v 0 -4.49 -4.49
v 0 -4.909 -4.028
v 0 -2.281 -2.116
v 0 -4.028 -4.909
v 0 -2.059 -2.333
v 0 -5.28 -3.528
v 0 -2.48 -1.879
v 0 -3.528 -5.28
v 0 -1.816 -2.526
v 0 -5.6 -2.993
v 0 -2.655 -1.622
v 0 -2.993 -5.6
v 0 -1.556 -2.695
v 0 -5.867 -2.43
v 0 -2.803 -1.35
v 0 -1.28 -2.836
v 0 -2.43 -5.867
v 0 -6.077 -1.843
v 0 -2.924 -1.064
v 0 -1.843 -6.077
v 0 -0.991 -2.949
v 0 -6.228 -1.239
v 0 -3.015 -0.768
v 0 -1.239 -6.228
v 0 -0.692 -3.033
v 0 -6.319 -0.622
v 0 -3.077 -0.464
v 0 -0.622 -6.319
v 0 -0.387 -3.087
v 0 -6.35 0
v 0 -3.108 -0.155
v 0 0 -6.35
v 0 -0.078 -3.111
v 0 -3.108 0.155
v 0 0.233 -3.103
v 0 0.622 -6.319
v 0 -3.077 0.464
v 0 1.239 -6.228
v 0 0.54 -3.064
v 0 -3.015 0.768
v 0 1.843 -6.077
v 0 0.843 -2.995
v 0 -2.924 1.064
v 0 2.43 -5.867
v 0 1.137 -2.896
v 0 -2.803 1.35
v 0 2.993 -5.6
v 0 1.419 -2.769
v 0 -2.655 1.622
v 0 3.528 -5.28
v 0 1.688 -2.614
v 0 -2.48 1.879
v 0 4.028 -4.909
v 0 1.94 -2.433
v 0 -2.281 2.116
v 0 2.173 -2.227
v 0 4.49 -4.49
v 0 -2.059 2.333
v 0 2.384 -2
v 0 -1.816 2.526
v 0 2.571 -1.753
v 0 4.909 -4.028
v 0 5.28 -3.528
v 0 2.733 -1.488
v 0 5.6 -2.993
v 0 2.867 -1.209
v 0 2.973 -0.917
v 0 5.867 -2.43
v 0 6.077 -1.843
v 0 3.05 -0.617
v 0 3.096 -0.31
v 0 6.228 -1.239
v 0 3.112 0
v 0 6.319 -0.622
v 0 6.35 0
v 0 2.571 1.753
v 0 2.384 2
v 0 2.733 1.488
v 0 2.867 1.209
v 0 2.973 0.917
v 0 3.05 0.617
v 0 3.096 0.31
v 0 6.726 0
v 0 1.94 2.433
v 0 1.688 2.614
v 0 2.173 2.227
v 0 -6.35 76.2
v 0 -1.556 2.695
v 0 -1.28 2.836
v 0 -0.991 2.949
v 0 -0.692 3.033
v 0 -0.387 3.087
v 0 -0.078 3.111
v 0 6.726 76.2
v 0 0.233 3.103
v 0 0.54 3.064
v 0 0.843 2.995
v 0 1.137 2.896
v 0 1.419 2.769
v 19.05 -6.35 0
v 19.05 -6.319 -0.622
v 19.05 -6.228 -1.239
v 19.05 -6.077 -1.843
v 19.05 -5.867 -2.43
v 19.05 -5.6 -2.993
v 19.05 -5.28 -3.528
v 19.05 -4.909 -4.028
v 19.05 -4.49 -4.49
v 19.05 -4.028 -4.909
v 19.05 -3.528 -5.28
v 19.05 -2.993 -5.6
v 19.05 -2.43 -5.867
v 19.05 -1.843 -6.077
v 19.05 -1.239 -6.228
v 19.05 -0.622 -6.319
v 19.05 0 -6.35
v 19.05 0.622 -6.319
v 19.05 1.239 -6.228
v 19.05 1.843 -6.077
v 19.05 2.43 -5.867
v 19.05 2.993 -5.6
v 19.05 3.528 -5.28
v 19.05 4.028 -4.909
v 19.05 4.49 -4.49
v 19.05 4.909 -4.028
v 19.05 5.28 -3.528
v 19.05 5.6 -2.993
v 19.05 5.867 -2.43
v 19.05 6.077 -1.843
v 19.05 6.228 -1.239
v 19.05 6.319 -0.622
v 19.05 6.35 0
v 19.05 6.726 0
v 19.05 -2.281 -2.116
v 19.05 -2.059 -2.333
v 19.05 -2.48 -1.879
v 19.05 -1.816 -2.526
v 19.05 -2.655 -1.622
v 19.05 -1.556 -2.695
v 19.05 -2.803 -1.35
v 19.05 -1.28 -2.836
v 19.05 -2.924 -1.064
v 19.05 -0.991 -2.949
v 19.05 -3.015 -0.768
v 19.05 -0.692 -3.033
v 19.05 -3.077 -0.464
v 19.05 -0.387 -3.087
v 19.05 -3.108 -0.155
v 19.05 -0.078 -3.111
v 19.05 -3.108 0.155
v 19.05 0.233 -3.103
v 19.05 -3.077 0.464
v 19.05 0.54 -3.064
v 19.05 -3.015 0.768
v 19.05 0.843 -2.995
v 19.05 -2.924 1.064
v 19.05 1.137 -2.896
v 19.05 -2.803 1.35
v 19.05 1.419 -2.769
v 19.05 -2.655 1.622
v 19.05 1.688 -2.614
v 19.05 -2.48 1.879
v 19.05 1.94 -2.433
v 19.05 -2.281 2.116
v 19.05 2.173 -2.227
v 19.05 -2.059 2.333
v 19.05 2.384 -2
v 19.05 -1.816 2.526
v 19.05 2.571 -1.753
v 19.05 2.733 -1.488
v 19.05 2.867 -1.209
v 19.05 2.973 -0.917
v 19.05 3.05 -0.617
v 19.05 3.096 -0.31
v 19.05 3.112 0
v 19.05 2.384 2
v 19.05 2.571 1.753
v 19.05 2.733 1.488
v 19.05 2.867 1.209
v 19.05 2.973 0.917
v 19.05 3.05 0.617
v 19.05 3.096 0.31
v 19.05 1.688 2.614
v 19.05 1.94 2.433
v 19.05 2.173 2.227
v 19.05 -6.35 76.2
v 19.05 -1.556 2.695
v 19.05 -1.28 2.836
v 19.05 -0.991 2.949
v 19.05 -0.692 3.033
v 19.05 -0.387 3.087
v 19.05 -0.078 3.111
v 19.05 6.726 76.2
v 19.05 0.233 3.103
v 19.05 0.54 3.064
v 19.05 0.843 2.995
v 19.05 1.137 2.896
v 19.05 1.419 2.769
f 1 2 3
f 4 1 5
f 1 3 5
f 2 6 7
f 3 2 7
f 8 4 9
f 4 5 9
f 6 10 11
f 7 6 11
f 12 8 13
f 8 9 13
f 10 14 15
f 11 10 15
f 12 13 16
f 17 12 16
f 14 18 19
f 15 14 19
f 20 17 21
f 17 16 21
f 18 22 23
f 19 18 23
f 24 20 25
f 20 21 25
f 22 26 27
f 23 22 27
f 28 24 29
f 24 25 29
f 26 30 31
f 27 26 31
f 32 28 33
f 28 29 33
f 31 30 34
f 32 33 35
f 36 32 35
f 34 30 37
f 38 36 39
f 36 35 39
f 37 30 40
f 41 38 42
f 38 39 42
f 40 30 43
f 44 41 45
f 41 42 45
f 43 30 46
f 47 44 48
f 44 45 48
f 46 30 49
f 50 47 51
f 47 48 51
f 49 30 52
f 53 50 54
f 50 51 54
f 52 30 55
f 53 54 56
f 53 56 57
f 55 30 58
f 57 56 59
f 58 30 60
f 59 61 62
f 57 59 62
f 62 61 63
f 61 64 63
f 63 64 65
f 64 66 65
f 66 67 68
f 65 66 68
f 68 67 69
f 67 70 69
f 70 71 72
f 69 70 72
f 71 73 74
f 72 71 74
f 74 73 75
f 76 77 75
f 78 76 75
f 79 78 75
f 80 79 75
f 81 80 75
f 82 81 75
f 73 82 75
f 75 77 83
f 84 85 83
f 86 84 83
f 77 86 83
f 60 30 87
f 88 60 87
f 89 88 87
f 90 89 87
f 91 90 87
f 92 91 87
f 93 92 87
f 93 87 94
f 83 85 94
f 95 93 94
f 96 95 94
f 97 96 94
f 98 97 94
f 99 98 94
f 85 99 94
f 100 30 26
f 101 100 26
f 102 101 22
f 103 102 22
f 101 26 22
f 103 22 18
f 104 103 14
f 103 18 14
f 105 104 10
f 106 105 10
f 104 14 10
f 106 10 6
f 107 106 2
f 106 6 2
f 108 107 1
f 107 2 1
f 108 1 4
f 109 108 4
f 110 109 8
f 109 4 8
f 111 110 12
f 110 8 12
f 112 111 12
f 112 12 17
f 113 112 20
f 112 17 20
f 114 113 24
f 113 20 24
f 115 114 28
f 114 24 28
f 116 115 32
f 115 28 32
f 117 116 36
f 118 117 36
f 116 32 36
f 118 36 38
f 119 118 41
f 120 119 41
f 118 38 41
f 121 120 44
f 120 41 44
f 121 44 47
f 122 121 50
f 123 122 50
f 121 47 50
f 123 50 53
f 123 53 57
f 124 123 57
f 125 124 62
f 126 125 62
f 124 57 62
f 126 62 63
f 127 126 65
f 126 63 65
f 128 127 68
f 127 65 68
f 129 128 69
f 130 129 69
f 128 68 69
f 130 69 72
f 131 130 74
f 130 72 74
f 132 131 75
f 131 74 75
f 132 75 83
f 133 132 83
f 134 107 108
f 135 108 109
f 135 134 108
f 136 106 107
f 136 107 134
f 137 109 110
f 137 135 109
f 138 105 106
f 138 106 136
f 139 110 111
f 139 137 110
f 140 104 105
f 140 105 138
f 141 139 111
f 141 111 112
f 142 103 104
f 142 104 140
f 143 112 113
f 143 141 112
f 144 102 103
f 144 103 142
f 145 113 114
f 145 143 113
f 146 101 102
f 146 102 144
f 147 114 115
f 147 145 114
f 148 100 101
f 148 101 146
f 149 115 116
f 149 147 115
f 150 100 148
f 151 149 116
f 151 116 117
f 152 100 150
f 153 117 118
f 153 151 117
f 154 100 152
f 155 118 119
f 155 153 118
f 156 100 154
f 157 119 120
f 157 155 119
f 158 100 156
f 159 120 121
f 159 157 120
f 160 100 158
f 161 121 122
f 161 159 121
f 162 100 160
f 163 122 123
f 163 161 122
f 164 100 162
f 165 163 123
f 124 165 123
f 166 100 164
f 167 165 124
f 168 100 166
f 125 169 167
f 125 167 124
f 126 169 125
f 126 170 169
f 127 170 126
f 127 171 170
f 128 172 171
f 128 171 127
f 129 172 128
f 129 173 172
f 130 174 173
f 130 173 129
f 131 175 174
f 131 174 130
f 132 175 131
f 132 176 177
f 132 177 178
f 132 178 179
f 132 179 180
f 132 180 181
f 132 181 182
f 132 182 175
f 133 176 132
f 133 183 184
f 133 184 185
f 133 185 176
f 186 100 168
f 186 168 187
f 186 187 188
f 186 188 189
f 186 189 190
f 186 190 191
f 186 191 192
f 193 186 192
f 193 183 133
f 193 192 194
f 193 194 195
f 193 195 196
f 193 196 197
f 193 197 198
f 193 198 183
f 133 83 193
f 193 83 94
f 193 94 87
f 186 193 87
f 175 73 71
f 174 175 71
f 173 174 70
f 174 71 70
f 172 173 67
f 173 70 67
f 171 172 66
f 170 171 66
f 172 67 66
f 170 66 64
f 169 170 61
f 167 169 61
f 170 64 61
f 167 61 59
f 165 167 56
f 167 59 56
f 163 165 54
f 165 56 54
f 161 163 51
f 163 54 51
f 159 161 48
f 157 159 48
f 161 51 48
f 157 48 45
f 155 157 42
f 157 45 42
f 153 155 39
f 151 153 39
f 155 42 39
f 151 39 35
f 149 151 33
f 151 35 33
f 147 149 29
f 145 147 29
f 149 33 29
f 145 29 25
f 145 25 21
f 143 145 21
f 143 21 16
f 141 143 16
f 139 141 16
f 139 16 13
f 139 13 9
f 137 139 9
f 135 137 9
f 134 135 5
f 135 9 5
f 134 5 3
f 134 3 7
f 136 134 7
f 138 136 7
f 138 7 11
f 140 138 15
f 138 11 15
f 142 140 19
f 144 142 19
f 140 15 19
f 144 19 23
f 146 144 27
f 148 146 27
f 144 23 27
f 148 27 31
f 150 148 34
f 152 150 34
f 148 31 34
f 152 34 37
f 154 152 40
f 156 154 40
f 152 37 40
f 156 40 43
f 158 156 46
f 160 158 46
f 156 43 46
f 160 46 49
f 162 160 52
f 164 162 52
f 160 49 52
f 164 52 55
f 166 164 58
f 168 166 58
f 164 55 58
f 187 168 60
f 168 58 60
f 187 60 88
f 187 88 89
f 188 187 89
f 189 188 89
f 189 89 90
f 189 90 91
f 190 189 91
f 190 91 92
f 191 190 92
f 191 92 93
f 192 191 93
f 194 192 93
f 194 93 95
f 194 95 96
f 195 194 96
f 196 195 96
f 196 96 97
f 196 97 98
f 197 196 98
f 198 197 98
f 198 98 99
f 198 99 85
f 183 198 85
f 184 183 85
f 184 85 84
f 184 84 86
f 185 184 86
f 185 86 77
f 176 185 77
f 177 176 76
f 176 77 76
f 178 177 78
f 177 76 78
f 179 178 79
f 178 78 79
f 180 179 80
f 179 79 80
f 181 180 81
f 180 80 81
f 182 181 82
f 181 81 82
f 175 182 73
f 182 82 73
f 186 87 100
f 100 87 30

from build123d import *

# Parameters (mm, degrees)
F1_DEPTH = 19.05


with BuildPart() as f1:
    # F0 (on Right) → F1 (new body)
    with BuildSketch(Plane.YZ):
        with BuildLine():
            ThreePointArc((-6.35, 0), (0, 6.35), (6.35, 0))
            Line((6.35, 0), (6.725732, 0))
            Line((6.725732, 0), (6.725732, 76.2))
            Line((6.725732, 76.2), (-6.35, 76.2))
            Line((-6.35, 76.2), (-6.35, 0))
        make_face()
        with BuildLine():
            Line((3.1115, 0), (6.35, 0))
            ThreePointArc((6.35, 0), (0, 6.35), (-6.35, 0))
            Line((-6.35, 0), (-3.1115, 0))
            ThreePointArc((-3.1115, 0), (0, 3.1115), (3.1115, 0))
        make_face()
        with BuildLine():
            ThreePointArc((-6.35, 0), (0, -6.35), (6.35, 0))
            Line((6.35, 0), (3.1115, 0))
            ThreePointArc((3.1115, 0), (0, -3.1115), (-3.1115, 0))
            Line((-3.1115, 0), (-6.35, 0))
        make_face()
    extrude(amount=F1_DEPTH)


solid = f1.part
